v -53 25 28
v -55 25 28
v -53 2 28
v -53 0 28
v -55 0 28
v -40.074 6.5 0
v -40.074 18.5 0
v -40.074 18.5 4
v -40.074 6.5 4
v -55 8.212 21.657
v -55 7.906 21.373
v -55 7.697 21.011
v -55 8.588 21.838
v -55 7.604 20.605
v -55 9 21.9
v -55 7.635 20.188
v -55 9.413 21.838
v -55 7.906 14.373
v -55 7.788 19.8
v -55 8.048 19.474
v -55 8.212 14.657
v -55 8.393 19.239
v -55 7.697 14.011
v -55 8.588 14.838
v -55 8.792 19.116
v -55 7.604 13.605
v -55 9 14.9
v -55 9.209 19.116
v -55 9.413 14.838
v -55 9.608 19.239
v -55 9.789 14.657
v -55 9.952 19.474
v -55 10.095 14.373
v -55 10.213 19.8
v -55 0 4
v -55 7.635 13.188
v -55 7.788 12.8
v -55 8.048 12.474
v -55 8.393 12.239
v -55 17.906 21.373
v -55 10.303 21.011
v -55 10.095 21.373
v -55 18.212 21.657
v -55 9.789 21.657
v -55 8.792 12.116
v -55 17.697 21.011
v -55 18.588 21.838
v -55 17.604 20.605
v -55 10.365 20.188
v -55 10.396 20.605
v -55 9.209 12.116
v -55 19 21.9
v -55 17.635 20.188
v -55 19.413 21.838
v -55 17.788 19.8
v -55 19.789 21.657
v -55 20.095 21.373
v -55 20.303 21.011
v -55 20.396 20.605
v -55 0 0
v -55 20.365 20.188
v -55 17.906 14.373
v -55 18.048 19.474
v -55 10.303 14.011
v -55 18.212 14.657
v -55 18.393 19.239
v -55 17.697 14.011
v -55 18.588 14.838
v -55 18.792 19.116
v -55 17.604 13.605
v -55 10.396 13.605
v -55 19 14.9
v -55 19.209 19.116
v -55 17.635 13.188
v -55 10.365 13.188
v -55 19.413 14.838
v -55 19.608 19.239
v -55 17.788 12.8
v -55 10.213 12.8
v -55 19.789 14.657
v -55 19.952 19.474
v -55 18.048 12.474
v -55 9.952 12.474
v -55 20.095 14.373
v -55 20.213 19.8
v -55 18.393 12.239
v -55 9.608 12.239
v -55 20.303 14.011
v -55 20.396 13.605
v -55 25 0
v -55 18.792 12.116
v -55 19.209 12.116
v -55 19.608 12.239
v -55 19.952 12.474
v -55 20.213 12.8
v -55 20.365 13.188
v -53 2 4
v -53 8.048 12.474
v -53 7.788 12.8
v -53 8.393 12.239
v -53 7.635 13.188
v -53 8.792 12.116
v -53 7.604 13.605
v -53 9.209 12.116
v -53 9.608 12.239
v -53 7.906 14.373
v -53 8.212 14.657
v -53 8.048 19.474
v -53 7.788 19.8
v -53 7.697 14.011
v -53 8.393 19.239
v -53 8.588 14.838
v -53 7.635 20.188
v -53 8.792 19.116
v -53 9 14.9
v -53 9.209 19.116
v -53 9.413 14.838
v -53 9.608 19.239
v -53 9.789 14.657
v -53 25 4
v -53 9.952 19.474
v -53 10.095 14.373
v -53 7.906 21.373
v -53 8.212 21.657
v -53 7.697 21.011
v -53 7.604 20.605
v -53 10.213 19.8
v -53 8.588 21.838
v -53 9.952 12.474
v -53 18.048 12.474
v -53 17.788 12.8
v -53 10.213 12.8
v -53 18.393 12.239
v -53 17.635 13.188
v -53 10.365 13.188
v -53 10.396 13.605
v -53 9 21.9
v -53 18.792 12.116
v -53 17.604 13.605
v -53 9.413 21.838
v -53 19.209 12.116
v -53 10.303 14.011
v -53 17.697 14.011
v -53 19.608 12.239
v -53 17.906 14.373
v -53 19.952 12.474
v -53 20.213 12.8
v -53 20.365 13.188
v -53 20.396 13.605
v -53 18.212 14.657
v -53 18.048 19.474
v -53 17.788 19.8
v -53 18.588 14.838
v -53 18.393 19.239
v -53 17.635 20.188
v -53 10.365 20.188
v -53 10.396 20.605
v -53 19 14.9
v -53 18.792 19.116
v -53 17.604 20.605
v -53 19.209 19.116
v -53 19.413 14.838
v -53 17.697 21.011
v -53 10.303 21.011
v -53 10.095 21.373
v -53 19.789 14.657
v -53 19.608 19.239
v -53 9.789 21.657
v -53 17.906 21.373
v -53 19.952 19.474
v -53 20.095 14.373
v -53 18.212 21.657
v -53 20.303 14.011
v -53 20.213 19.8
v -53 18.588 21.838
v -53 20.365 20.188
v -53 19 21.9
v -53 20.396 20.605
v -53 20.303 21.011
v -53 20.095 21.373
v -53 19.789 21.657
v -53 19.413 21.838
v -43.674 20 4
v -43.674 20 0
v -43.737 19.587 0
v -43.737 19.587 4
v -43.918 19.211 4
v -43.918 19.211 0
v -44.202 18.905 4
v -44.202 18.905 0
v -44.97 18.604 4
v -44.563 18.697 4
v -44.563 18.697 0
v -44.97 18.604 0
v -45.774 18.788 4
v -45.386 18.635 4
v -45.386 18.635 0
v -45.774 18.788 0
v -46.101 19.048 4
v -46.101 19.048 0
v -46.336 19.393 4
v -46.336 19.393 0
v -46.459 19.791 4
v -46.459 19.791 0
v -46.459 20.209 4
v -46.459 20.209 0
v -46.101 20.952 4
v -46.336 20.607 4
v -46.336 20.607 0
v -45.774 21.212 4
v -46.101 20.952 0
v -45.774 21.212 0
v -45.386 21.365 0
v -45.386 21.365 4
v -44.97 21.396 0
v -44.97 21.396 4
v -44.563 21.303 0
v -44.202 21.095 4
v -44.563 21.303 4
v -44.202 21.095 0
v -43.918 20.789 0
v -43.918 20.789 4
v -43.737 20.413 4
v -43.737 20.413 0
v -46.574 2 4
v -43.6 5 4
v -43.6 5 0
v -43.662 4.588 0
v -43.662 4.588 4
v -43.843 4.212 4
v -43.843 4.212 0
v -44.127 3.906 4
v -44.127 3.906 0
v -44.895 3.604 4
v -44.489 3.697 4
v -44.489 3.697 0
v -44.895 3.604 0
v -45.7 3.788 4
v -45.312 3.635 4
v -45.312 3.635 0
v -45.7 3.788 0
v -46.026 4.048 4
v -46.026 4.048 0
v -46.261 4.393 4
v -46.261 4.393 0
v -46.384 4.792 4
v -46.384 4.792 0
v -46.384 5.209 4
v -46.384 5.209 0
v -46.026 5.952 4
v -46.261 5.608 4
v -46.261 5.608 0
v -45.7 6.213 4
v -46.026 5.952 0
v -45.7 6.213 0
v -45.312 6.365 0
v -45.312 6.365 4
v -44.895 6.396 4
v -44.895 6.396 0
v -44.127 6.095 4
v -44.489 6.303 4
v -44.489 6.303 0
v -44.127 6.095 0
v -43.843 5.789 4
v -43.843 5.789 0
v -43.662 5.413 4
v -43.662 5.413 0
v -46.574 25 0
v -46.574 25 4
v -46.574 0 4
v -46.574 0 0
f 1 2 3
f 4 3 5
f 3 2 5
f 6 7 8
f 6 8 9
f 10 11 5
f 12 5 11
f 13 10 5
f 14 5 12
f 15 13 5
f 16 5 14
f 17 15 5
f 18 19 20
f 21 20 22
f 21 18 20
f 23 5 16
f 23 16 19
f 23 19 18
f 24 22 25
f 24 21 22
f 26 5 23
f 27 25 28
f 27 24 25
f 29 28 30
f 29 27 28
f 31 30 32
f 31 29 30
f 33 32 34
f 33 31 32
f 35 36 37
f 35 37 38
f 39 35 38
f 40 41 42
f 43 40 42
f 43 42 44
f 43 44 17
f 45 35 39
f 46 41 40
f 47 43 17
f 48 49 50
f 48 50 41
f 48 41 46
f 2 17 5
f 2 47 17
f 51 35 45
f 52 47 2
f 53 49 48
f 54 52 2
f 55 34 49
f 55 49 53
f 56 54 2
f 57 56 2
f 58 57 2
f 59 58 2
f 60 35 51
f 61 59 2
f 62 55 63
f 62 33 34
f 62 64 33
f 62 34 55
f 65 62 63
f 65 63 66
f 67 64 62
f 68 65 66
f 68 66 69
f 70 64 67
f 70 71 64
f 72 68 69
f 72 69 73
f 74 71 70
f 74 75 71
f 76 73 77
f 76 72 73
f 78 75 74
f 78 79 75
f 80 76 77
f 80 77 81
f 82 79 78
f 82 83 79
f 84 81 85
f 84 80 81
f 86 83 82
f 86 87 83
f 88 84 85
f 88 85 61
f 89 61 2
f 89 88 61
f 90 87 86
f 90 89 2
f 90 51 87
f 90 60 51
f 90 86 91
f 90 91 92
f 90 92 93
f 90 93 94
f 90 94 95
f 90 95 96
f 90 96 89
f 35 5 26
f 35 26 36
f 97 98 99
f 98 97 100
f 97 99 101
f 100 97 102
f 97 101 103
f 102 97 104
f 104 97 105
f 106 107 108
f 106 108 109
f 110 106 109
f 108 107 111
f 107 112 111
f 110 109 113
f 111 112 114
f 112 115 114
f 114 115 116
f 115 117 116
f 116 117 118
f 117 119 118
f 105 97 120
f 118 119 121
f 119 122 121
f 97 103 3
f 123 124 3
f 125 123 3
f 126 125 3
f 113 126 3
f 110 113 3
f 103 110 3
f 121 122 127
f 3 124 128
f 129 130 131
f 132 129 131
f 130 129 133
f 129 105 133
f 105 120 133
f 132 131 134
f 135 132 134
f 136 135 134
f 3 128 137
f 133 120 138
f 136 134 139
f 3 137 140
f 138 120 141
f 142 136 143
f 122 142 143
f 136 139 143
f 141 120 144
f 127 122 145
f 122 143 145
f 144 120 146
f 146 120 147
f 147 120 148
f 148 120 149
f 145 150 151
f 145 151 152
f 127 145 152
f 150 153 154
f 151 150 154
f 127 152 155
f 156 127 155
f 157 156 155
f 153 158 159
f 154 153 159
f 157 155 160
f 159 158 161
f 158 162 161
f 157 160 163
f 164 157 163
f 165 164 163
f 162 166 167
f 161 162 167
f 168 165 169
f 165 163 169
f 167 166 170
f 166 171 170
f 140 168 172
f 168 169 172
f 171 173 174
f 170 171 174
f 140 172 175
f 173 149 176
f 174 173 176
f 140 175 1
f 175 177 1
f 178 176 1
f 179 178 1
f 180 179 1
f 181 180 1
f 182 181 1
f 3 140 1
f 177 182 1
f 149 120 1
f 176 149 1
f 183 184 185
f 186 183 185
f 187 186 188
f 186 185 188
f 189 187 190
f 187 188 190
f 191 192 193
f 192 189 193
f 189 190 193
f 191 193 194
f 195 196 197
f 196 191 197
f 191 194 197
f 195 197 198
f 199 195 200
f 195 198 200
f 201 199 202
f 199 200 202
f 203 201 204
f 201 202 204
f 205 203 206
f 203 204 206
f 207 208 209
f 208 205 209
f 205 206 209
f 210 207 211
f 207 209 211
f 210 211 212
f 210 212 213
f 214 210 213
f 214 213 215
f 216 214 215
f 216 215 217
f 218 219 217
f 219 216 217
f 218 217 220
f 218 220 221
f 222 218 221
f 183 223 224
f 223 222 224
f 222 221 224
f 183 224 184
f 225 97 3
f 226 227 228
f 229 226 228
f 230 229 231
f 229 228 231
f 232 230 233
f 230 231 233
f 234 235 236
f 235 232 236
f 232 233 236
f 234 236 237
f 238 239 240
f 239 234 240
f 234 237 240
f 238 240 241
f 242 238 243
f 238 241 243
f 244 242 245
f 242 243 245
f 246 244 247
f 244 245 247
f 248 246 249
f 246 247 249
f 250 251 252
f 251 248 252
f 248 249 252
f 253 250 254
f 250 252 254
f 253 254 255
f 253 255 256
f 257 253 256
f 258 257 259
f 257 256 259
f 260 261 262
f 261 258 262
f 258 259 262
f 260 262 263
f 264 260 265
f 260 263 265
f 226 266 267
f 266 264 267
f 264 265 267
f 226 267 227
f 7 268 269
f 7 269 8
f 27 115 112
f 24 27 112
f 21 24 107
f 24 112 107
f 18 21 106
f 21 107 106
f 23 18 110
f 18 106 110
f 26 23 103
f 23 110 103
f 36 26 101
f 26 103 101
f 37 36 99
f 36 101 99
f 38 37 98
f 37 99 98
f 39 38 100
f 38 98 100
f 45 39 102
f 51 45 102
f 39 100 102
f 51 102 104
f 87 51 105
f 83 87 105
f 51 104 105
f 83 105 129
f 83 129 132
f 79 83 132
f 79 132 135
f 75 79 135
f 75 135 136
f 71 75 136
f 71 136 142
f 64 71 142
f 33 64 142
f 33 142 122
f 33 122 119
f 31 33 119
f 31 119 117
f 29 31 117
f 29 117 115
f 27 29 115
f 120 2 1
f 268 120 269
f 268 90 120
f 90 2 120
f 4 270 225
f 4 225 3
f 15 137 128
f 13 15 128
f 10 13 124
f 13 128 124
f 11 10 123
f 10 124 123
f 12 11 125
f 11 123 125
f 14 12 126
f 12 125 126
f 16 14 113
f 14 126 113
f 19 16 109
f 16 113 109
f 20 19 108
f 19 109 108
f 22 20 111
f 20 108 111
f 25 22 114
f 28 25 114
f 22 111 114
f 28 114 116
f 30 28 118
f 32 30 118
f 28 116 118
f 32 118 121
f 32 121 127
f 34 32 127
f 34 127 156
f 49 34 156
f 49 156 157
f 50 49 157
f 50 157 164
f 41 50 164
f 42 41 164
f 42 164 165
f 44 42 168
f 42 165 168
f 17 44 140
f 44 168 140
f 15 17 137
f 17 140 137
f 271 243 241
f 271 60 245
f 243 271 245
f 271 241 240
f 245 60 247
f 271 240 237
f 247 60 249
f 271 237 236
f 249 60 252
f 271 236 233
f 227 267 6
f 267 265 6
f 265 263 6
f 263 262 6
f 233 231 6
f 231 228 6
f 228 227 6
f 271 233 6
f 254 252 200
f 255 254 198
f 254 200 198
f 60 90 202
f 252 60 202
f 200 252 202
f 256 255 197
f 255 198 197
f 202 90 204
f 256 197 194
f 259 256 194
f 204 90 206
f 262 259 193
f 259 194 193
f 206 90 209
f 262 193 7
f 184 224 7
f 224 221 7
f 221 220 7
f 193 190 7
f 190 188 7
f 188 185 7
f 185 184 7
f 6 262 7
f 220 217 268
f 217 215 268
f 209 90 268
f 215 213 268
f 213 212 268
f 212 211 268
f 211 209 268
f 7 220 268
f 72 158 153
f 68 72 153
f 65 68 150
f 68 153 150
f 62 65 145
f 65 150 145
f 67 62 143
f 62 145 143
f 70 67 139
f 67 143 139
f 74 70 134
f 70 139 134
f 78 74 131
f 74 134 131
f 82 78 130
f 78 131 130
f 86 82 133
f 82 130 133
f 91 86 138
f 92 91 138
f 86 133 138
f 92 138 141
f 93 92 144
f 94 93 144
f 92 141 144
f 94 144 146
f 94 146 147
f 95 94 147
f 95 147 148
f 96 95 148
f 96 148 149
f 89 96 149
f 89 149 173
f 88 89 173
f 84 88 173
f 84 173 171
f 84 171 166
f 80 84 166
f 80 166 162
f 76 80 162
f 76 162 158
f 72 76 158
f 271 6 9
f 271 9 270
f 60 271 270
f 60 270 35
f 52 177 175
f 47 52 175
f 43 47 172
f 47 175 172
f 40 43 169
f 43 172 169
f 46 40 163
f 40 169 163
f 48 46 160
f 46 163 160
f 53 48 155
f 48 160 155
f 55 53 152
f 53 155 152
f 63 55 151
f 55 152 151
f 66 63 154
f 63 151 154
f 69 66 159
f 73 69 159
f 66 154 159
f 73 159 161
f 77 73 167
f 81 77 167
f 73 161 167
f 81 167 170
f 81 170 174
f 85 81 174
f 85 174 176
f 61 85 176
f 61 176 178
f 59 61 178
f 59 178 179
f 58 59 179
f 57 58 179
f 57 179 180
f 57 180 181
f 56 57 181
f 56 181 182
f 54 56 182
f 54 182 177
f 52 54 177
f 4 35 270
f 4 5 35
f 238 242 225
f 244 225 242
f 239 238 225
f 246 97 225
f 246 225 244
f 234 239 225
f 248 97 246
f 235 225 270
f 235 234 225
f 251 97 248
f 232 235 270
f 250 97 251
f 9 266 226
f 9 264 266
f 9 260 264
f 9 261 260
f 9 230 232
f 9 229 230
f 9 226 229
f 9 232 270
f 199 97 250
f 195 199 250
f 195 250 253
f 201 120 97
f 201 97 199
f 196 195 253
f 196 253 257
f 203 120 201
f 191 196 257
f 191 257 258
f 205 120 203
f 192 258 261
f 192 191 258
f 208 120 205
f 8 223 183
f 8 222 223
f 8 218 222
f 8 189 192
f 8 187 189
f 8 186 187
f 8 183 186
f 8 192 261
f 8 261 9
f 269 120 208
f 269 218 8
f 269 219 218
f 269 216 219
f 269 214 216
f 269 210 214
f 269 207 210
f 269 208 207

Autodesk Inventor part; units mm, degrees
ref_plane "YZ Plane" through (0, 0, 0) normal (1, 0, 0) x (0, 1, 0)
ref_plane "XZ Plane" through (0, 0, 0) normal (0, 1, 0) x (-1, 0, 0)
ref_plane "XY Plane" through (0, 0, 0) normal (0, 0, 1) x (1, 0, 0)
sketch "Sketch1" plane through (0, 0, 0) normal (0, 0, 1) x (1, 0, 0)
  circle A0 centre (-45.0744, 20) radius 1.4 projected
  circle A1 centre (-45, 5.0002) radius 1.4 projected
  line L0 (-55, 0) -> (-55, 35) projected
  line L1 (-55, 25) -> (-46.5743, 25)
  line L2 (-46.5743, 25) -> (-40.0744, 18.5001)
  line L3 (-40.0744, 18.5001) -> (-40.0744, 6.5001)
  line L4 (-40.0744, 6.5001) -> (-46.5743, 0.0002)
  line L5 (-46.5743, 0.0002) -> (-55, 0.0002)
  point P0 (0, 0)
  point P1 (-50.7872, 0.0002)
  dimension "d0" = 5
  dimension "d1" = 5
  dimension "d2" = 45
  dimension "d3" = 5
  dimension "d4" = 12
extrude "Extrusion1" add sketch "Sketch1" along normal blind 4
sketch "Sketch2" plane through (-55, 0.0002, 0) normal (-1, 0, 0) x (0, 0, 1)
  line L0 (0, 24.9998) -> (0, 0) projected
  line L1 (0, 0) -> (4, 0) projected
  line L2 (4, 24.9998) -> (4, 0) projected
  line L3 (0, 24.9998) -> (4, 24.9998) projected
  line L4 (4, 18.4999) -> (4, 24.9998) projected
  line L5 (4, 24.9998) -> (28, 24.9998)
  line L6 (28, 24.9998) -> (28, 0)
  line L7 (4, 24.9998) -> (4, 0) projected
  line L8 (28, 0) -> (4, 0)
  point P0 (0, -0.0002)
  dimension "d7" = 24
extrude "Extrusion2" add sketch "Sketch2" against normal blind 2 contours L5 L6 L8 L2
sketch "Sketch4" plane through (-55, 0.0002, 0) normal (0, -1, 0) x (1, 0, 0)
  line L0 (2, 28) -> (2, 4) projected
  line L1 (2, 4) -> (8.4257, 4) projected
  line L2 (8.4257, 0) -> (8.4257, 4) projected
  line L3 (2, 4) -> (2, 28) projected
  line L4 (8.4257, 4) -> (2, 28)
  point P0 (55, 0)
extrude "Extrusion4" add sketch "Sketch4" against normal blind 2
sketch "Sketch5" plane through (-55, 0.0002, 0) normal (-1, 0, 0) x (0, 0, 1)
  line L0 (0, 24.9998) -> (0, 0) projected
  line L1 (0, 0) -> (28, 0) projected
  line L2 (28, 0) -> (28, 24.9998) projected
  line L3 (0, 24.9998) -> (28, 24.9998) projected
  point P0 (0, -0.0002)
  point P1 (20.5, 19)
  point P2 (20.5, 9)
  point P3 (13.5, 9)
  point P4 (13.5, 19)
  dimension "d14" = 9
  dimension "d15" = 7
  dimension "d16" = 10
  dimension "d17" = 7.5
hole "Hole1" at (-55, 19.0002, 20.5) at (-55, 9.0002, 20.5) at (-55, 9.0002, 13.5) at (-55, 19.0002, 13.5) direction (1, 0, 0) diameter 2.8 end through all
equation "\"d1\" = d0"
equation "\"d3\" = d0"
properties part number "Drag Chain Base" material "ABS Plastic"
